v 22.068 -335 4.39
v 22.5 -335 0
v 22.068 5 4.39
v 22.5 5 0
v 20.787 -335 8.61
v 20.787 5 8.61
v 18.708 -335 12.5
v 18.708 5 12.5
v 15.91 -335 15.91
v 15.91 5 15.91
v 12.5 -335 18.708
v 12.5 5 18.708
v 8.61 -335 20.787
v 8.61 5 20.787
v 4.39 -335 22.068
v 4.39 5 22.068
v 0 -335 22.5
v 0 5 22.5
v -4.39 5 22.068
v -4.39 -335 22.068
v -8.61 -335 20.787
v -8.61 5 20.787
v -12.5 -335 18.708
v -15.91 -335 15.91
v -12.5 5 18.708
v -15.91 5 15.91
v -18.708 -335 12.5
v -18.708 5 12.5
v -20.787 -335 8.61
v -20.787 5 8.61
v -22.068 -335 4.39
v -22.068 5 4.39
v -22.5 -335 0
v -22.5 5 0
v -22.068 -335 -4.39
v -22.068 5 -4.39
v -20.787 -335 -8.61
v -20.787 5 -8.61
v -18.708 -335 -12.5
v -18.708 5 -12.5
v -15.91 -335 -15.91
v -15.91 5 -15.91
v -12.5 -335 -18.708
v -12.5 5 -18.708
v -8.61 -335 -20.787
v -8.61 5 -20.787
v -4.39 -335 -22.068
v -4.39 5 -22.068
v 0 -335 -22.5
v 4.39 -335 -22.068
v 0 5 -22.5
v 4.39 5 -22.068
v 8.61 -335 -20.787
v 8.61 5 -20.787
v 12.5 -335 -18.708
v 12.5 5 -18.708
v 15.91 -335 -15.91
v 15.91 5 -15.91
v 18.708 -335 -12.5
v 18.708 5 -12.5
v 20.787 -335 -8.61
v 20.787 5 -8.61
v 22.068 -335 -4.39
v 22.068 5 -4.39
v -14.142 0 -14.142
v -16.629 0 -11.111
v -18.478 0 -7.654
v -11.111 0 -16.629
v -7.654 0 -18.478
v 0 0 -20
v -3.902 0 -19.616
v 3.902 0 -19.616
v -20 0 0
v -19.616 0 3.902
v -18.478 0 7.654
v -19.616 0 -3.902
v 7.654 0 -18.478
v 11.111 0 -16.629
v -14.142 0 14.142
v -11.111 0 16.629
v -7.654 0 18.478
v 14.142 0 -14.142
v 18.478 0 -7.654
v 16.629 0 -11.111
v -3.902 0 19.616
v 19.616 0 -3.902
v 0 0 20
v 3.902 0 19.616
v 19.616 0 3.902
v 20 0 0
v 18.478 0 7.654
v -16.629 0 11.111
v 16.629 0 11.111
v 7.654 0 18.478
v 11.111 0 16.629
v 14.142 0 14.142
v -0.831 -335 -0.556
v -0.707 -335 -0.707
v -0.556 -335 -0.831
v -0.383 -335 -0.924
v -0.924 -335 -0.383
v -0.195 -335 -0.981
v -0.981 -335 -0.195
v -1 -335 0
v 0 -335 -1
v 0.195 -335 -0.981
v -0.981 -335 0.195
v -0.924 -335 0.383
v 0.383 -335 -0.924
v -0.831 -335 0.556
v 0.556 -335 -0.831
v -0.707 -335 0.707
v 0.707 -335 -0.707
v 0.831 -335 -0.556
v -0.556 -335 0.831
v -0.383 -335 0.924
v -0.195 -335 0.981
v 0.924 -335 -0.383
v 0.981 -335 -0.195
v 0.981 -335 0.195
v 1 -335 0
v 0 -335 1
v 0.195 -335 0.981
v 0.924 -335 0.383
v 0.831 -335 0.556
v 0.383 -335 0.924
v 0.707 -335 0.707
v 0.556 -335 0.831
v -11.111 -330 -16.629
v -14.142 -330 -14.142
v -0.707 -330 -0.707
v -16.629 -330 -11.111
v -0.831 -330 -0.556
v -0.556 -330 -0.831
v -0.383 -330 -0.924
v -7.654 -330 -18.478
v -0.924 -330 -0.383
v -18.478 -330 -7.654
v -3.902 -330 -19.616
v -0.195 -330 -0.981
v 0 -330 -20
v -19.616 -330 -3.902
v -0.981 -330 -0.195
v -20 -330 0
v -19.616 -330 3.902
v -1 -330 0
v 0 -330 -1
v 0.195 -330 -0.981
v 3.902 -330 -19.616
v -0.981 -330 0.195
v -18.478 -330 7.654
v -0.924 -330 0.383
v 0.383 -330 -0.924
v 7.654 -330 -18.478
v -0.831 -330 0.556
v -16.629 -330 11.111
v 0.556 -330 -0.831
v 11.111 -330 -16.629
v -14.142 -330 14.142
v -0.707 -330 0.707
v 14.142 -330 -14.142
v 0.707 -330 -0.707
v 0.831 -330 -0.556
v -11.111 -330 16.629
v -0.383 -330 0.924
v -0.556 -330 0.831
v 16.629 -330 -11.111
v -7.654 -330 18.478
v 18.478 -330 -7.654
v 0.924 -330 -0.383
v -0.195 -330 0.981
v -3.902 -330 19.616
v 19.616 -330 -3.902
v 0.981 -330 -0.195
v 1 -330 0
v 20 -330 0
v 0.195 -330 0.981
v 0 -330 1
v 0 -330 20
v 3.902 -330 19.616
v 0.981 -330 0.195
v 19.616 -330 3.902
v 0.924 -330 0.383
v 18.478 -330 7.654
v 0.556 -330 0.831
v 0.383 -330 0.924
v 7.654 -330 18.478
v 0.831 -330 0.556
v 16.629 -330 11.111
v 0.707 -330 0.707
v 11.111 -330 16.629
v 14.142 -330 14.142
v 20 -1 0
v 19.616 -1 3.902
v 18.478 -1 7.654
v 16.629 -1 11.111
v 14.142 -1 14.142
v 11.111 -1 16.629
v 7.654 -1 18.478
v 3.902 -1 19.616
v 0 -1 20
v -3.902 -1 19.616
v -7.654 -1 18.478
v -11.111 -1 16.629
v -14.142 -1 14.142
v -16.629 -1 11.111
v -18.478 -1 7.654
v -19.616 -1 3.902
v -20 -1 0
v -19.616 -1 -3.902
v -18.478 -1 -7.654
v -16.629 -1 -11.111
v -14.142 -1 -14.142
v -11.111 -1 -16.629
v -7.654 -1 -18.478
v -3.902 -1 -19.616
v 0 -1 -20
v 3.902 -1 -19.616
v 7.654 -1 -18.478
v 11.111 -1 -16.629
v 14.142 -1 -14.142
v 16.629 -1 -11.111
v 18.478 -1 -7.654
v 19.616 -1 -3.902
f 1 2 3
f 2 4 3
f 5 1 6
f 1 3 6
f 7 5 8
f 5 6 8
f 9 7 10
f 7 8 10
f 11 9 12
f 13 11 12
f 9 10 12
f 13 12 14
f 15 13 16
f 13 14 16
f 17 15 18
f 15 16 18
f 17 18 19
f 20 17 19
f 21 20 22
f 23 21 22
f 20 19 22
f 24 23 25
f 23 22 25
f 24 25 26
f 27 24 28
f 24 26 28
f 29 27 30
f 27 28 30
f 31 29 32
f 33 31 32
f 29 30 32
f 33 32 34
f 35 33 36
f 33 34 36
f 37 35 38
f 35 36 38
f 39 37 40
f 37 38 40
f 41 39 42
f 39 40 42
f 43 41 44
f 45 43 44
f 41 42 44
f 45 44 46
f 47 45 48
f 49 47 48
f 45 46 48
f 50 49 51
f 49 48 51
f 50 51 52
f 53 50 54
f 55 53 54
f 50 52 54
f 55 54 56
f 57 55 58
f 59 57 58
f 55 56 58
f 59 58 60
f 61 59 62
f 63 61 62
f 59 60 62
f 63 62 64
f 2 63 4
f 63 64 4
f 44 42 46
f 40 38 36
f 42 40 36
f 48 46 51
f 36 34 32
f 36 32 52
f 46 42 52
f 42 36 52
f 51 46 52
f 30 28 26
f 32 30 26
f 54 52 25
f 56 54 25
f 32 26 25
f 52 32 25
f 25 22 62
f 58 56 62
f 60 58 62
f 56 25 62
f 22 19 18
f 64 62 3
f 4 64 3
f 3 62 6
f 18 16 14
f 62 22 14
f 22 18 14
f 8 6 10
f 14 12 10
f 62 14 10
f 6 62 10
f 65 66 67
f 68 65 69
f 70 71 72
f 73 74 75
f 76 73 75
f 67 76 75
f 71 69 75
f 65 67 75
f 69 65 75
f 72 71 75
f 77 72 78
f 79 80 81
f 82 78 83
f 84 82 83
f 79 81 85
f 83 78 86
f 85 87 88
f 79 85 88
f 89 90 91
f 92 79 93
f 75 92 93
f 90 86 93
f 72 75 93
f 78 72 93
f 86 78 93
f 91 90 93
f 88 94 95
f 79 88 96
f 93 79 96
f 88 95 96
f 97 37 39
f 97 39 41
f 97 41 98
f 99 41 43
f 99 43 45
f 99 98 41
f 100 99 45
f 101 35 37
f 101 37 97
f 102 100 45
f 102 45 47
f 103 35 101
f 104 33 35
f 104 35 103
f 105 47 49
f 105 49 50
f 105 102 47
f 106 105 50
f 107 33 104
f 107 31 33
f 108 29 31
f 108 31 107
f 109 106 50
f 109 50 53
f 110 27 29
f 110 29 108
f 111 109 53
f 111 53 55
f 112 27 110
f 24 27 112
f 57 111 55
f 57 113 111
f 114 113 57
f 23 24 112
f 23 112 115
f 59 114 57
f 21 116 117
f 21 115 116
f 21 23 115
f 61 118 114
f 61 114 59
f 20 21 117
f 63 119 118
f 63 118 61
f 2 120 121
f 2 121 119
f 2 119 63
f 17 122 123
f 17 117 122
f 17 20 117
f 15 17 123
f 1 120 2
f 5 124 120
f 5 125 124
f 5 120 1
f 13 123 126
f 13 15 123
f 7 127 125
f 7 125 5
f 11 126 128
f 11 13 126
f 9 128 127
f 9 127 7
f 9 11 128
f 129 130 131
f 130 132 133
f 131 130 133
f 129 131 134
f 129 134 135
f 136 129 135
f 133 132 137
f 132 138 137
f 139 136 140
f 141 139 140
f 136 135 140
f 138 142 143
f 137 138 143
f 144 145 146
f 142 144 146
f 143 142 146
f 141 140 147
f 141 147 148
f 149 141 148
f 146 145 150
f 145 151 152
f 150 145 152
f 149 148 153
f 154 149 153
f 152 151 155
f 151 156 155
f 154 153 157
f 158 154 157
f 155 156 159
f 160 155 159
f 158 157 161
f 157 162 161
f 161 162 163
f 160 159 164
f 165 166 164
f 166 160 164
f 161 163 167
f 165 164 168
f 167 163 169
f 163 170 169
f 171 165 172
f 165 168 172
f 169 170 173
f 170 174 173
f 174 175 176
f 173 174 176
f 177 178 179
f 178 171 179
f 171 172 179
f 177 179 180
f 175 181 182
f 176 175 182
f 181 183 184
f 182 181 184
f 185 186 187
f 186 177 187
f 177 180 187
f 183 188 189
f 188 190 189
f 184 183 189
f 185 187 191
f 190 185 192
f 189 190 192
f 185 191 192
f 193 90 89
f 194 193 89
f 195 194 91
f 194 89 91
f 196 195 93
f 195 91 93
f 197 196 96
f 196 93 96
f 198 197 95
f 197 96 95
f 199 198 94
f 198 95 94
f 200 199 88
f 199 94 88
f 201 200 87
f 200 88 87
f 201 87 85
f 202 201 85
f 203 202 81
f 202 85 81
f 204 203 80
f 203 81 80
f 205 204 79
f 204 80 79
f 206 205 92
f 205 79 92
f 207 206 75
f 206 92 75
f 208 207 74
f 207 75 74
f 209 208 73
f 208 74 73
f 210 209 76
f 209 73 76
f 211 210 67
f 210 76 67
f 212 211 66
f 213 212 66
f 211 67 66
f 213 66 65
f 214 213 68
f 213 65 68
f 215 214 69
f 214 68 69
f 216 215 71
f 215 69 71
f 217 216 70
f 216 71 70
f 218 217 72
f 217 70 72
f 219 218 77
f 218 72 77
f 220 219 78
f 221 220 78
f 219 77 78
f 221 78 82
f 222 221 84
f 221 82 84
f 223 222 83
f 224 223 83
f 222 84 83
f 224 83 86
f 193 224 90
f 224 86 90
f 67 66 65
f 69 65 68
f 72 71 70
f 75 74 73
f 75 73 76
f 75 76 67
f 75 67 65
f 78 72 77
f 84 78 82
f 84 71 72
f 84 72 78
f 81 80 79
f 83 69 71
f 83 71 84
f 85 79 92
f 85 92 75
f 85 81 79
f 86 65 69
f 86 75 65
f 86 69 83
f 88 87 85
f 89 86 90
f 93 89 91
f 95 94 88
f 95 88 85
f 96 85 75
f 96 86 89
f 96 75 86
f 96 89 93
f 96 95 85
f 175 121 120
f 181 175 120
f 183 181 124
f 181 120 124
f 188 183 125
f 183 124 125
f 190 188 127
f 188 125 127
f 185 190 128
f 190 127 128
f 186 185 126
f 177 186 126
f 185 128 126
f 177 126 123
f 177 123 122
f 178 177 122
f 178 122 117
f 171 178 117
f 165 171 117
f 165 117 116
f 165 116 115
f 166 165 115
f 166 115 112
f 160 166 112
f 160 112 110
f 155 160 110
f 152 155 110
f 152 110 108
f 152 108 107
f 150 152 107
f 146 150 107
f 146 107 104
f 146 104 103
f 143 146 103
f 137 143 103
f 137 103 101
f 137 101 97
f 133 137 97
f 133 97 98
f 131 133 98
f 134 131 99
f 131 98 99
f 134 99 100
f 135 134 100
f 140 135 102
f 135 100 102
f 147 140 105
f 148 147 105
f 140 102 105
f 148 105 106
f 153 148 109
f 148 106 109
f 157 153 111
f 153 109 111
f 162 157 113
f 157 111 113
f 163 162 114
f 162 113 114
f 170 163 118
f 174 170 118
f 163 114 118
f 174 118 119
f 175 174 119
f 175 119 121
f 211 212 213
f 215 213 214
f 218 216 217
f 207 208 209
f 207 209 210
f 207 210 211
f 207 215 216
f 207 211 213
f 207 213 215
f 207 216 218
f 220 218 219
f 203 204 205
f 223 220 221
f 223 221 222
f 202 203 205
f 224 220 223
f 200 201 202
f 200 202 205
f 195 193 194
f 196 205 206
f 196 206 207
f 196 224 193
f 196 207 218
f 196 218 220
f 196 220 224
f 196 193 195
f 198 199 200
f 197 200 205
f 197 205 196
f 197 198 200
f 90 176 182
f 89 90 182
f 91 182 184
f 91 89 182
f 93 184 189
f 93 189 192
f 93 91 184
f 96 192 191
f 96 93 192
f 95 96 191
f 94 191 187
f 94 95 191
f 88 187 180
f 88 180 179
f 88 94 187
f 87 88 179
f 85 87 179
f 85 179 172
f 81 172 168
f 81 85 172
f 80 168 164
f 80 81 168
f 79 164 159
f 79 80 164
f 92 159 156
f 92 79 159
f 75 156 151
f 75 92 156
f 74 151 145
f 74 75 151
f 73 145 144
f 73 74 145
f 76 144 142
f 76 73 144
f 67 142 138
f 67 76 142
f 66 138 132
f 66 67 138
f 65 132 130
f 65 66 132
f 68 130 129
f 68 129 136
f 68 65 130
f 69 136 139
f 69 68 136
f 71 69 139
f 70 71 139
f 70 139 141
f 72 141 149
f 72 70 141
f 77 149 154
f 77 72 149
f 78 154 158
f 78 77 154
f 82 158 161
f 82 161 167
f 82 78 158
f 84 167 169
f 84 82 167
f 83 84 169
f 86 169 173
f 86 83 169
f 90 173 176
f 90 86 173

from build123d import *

# Parameters (mm, degrees)
F0_R     = 22.5
F0_R_2   = 20
F1_DEPTH = 330
F2_R     = 22.5
F3_DEPTH = 5
F4_R     = 22.5
F5_DEPTH = 5
F0_R_3   = 0.75
F7_DEPTH = 1
F6_R     = 1
F8_DEPTH = 25


with BuildPart() as f1:
    # F0 (on Front) → F1 (new body)
    with BuildSketch(Plane.XZ):
        Circle(F0_R)
        Circle(F0_R_2, mode=Mode.SUBTRACT)
    extrude(amount=F1_DEPTH)

    # F2 (on Front) → F3 (join)
    with BuildSketch(Plane.XZ):
        Circle(F2_R)
    extrude(amount=-F3_DEPTH)

    # F4 (on face) → F5 (join)
    with BuildSketch(Plane.XZ.offset(330)):
        Circle(F4_R)
    extrude(amount=F5_DEPTH)

    # F6 (on face) → F8 (cut)
    with BuildSketch(Plane.XZ.offset(335)):
        Circle(F6_R)
    extrude(amount=-F8_DEPTH, mode=Mode.SUBTRACT)


with BuildPart() as f7:
    # F0 (on Front) → F7 (new body)
    with BuildSketch(Plane.XZ):
        Circle(F0_R_2)
        Circle(F0_R_3, mode=Mode.SUBTRACT)
        Circle(F0_R_3)
    extrude(amount=F7_DEPTH)


solid = Compound([f1.part, f7.part])
